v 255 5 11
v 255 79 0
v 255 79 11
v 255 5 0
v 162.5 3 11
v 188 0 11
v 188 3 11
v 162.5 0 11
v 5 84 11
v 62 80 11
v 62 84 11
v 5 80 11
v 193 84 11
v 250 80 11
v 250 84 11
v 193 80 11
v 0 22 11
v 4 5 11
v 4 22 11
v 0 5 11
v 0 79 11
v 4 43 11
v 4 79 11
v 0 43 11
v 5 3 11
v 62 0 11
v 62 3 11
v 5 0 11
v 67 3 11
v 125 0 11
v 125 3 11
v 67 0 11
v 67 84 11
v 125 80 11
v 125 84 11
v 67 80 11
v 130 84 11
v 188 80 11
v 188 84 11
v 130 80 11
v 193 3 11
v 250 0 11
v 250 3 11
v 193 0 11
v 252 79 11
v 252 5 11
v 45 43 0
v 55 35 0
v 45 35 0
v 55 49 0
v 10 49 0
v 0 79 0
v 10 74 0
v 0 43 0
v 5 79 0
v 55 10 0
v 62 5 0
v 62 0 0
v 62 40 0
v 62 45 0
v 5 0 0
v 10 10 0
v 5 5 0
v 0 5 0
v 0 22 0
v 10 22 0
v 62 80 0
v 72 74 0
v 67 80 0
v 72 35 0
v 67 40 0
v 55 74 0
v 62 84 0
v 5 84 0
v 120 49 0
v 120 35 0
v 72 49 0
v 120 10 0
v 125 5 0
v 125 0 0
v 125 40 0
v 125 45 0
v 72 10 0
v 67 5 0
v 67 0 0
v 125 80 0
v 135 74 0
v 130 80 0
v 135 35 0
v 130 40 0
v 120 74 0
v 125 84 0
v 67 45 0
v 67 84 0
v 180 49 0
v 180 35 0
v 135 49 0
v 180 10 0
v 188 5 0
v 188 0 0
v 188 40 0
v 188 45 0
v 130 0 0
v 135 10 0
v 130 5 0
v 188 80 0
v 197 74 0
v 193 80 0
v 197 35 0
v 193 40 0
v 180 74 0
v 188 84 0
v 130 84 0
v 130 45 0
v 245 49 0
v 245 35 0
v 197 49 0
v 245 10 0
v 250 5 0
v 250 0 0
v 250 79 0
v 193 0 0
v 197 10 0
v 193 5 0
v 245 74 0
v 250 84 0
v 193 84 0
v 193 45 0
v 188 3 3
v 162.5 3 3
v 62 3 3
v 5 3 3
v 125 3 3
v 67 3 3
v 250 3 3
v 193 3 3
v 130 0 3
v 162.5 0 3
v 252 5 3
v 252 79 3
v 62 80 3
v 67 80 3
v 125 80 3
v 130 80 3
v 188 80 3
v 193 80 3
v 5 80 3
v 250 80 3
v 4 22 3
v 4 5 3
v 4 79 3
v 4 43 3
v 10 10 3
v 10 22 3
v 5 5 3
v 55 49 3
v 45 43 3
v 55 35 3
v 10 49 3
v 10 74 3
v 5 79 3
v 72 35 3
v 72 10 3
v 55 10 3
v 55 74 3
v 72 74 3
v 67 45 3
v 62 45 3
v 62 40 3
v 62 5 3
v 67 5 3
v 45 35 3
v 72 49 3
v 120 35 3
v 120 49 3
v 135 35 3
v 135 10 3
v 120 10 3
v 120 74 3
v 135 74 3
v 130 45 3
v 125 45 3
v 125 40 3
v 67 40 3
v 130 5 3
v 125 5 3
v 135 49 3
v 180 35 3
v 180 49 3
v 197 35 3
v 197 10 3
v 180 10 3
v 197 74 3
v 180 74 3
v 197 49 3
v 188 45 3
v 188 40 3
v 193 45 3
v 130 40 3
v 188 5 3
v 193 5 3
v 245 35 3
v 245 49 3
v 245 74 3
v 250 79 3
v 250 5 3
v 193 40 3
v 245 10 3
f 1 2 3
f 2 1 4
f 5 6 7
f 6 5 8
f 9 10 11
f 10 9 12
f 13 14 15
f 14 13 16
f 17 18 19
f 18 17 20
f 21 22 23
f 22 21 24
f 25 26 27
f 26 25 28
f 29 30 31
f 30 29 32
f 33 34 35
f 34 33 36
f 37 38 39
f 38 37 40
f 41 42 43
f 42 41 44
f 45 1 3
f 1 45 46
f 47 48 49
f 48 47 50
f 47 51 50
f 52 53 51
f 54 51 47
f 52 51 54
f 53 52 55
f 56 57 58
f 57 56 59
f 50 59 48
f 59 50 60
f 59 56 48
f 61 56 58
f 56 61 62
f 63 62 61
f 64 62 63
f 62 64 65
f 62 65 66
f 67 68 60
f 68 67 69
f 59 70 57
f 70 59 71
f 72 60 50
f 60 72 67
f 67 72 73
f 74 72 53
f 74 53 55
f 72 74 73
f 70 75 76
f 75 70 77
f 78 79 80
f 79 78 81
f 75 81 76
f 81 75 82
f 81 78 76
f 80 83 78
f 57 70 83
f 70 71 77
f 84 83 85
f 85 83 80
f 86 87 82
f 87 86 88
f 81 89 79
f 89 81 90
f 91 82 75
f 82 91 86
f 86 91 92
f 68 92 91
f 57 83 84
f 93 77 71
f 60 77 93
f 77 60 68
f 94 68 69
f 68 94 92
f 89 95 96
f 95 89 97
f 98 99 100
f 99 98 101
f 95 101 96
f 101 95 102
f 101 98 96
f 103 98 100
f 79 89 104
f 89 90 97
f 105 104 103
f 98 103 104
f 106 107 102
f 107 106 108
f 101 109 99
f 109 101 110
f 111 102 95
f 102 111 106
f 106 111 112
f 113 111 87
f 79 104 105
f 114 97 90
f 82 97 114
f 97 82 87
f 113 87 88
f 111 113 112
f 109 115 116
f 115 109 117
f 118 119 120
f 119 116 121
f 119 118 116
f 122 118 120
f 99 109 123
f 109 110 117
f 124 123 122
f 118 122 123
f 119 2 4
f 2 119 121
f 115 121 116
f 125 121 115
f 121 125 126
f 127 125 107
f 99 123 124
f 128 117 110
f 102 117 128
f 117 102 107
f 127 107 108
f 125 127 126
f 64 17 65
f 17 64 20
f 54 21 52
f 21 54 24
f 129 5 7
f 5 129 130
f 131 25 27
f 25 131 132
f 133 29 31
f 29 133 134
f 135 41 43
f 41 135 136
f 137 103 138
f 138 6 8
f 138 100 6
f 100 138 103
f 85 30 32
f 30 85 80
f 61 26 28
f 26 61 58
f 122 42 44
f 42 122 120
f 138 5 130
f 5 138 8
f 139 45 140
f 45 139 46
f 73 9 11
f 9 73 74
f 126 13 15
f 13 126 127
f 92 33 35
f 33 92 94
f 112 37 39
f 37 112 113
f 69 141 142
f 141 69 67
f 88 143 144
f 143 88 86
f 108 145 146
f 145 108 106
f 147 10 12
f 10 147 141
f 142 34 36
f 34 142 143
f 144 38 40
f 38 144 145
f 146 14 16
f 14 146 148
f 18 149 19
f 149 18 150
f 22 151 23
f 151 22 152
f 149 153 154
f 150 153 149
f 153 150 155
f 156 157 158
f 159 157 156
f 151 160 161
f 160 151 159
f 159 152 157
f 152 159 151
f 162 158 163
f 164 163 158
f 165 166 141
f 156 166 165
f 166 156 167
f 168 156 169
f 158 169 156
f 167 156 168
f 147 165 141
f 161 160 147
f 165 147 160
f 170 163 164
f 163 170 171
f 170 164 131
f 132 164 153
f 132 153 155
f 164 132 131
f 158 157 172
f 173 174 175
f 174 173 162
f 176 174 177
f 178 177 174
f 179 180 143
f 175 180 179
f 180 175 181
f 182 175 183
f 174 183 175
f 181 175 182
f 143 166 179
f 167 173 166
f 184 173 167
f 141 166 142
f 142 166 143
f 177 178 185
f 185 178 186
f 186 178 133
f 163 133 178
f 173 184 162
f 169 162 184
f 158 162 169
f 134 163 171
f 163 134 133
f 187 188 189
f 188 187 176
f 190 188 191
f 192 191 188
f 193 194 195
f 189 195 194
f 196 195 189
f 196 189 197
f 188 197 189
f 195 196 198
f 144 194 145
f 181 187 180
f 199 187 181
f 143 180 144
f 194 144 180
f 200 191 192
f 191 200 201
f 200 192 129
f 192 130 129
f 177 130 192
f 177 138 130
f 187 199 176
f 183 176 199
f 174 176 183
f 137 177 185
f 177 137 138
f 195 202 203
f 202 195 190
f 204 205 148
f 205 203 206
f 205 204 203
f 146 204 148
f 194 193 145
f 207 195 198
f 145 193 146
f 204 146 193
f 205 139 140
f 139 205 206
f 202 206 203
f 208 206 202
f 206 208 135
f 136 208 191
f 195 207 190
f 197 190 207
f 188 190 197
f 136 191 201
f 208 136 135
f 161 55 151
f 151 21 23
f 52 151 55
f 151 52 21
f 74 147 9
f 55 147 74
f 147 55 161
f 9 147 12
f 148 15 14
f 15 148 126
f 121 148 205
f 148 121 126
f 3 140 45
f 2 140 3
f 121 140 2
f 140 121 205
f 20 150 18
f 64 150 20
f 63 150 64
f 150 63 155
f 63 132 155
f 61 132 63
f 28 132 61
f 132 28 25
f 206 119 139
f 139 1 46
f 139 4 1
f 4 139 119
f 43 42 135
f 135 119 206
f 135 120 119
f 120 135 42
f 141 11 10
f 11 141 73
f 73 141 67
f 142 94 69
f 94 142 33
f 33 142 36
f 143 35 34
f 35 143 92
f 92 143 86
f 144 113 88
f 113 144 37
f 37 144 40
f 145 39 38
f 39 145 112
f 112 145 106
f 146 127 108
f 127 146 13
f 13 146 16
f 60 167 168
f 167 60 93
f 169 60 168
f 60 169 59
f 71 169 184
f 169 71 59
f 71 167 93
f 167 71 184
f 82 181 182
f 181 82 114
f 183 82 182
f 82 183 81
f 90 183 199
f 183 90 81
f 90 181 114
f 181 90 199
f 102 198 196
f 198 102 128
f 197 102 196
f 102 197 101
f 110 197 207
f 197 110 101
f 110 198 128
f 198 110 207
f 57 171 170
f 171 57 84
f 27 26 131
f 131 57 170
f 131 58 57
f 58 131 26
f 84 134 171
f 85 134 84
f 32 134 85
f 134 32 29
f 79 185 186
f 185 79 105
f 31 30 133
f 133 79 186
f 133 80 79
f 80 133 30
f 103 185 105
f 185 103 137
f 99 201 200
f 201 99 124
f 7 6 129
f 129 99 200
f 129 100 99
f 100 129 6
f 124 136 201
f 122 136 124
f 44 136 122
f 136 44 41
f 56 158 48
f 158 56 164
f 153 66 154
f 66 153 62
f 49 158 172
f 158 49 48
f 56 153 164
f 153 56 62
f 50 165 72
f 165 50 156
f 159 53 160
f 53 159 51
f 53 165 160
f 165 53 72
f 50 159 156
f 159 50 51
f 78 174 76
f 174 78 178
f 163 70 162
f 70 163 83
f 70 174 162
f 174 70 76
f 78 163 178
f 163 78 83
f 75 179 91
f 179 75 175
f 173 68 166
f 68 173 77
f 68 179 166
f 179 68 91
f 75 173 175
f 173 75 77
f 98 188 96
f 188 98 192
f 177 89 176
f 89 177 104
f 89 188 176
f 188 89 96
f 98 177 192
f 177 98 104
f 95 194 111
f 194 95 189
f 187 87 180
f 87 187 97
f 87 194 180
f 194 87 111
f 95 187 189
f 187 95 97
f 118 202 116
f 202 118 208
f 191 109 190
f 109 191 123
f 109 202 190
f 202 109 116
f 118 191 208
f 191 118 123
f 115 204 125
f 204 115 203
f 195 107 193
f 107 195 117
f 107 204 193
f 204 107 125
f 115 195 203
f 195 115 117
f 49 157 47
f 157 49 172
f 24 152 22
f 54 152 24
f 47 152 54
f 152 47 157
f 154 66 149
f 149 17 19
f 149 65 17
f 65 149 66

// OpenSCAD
// Filler plate for the TG4X

// Keyboard dimensions
KBD_WIDTH = 255;
KBD_HEIGHT = 84;

// Global cutout sizing
CUTOUT_DEPTH = 20;

// Used to automatically render each half to a different STL file
ENABLE_HALVES = [ true, true ];

module place_standoff_holes(x = 5, y = 5) {
  linear_extrude(height = CUTOUT_DEPTH) {
    // Left
    translate([ 62, 0, 0 ]) square([ x, y ]);
    // Middle
    translate([ 125, 0, 0 ]) square([ x, y ]);
    // Right
    translate([ 188, 0, 0 ]) square([ x, y ]);
  }
}

// Used to slice the model into halves for printing
difference() {
  // Model
  difference() {
    // The fill shape
    union() {
      // Keyboard bounds
      cube([ KBD_WIDTH, KBD_HEIGHT, 3 ]);

      // Walls
      union() {
        // Right wall
        translate([ KBD_WIDTH - 3, 0, 0 ]) cube([ 3, KBD_HEIGHT, 11 ]);
        // Top wall
        translate([ 0, KBD_HEIGHT - 4, 0 ]) cube([ KBD_WIDTH, 4, 11 ]);
        // Left wall
        translate([ 0, 0, 0 ]) cube([ 4, KBD_HEIGHT, 11 ]);
        // Front wall
        difference() {
          translate([ 0, 0, 0 ]) cube([ KBD_WIDTH, 3, 11 ]);
          translate([ KBD_WIDTH / 2, 0, 0 ]) cube([ 35, 10, 20 ]);
        }
      }
    }

    // Cut out the standoff holes
    union() {
      // Corner cuts
      linear_extrude(height = CUTOUT_DEPTH) {
        // Top left
        translate([ 0, 79, 0 ]) square([ 5, 5 ]);
        // Bottom left
        translate([ 0, 0, 0 ]) square([ 5, 5 ]);
        // Top right
        translate([ 250, 79, 0 ]) square([  5, 5 ]);
        // Bottom right
        translate([ 250, 0, 0 ]) square([  5, 5]);
      }

      // Centeral standoff holes
      translate([ 0, 80, 0 ]) place_standoff_holes();
      translate([ 0, 40, 0 ]) place_standoff_holes(y = 5);
      translate([ 0, 0, 0 ]) place_standoff_holes();
    }

    // Cut out a space for the controller
    translate([ 0, 22, 0 ]) cube([ 45, 21, CUTOUT_DEPTH ]);

    // Removal of unnecessary material
    union() {
      // Section 1
      union() {
        translate([ 10, 10, 0 ]) cube([ 45, 25, 10 ]);
        translate([ 10, KBD_HEIGHT - 10 - 25, 0 ]) cube([ 45, 25, 10 ]);
      }
      // Section 2
      union() {
        translate([ 72, 10, 0 ]) cube([ 48, 25, 10 ]);
        translate([ 72, KBD_HEIGHT - 10 - 25, 0 ]) cube([ 48, 25, 10 ]);
      }
      // Section 3
      union() {
        translate([ 135, 10, 0 ]) cube([ 45, 25, 10 ]);
        translate([ 135, KBD_HEIGHT - 10 - 25, 0 ]) cube([ 45, 25, 10 ]);
      }
      // Section 4
      union() {
        translate([ 197, 10, 0 ]) cube([ 48, 25, 10 ]);
        translate([ 197, KBD_HEIGHT - 10 - 25, 0 ]) cube([ 48, 25, 10 ]);
      }
    }
  }

  // Slicing functionality
  if (!ENABLE_HALVES[0]) {
    translate([ 0, 0, 0 ]) cube([ KBD_WIDTH / 2, KBD_HEIGHT, 30 ]);
  }
  if (!ENABLE_HALVES[1]) {
    translate([ KBD_WIDTH / 2, 0, 0 ]) cube([ KBD_WIDTH / 2, KBD_HEIGHT, 30 ]);
  }
}
